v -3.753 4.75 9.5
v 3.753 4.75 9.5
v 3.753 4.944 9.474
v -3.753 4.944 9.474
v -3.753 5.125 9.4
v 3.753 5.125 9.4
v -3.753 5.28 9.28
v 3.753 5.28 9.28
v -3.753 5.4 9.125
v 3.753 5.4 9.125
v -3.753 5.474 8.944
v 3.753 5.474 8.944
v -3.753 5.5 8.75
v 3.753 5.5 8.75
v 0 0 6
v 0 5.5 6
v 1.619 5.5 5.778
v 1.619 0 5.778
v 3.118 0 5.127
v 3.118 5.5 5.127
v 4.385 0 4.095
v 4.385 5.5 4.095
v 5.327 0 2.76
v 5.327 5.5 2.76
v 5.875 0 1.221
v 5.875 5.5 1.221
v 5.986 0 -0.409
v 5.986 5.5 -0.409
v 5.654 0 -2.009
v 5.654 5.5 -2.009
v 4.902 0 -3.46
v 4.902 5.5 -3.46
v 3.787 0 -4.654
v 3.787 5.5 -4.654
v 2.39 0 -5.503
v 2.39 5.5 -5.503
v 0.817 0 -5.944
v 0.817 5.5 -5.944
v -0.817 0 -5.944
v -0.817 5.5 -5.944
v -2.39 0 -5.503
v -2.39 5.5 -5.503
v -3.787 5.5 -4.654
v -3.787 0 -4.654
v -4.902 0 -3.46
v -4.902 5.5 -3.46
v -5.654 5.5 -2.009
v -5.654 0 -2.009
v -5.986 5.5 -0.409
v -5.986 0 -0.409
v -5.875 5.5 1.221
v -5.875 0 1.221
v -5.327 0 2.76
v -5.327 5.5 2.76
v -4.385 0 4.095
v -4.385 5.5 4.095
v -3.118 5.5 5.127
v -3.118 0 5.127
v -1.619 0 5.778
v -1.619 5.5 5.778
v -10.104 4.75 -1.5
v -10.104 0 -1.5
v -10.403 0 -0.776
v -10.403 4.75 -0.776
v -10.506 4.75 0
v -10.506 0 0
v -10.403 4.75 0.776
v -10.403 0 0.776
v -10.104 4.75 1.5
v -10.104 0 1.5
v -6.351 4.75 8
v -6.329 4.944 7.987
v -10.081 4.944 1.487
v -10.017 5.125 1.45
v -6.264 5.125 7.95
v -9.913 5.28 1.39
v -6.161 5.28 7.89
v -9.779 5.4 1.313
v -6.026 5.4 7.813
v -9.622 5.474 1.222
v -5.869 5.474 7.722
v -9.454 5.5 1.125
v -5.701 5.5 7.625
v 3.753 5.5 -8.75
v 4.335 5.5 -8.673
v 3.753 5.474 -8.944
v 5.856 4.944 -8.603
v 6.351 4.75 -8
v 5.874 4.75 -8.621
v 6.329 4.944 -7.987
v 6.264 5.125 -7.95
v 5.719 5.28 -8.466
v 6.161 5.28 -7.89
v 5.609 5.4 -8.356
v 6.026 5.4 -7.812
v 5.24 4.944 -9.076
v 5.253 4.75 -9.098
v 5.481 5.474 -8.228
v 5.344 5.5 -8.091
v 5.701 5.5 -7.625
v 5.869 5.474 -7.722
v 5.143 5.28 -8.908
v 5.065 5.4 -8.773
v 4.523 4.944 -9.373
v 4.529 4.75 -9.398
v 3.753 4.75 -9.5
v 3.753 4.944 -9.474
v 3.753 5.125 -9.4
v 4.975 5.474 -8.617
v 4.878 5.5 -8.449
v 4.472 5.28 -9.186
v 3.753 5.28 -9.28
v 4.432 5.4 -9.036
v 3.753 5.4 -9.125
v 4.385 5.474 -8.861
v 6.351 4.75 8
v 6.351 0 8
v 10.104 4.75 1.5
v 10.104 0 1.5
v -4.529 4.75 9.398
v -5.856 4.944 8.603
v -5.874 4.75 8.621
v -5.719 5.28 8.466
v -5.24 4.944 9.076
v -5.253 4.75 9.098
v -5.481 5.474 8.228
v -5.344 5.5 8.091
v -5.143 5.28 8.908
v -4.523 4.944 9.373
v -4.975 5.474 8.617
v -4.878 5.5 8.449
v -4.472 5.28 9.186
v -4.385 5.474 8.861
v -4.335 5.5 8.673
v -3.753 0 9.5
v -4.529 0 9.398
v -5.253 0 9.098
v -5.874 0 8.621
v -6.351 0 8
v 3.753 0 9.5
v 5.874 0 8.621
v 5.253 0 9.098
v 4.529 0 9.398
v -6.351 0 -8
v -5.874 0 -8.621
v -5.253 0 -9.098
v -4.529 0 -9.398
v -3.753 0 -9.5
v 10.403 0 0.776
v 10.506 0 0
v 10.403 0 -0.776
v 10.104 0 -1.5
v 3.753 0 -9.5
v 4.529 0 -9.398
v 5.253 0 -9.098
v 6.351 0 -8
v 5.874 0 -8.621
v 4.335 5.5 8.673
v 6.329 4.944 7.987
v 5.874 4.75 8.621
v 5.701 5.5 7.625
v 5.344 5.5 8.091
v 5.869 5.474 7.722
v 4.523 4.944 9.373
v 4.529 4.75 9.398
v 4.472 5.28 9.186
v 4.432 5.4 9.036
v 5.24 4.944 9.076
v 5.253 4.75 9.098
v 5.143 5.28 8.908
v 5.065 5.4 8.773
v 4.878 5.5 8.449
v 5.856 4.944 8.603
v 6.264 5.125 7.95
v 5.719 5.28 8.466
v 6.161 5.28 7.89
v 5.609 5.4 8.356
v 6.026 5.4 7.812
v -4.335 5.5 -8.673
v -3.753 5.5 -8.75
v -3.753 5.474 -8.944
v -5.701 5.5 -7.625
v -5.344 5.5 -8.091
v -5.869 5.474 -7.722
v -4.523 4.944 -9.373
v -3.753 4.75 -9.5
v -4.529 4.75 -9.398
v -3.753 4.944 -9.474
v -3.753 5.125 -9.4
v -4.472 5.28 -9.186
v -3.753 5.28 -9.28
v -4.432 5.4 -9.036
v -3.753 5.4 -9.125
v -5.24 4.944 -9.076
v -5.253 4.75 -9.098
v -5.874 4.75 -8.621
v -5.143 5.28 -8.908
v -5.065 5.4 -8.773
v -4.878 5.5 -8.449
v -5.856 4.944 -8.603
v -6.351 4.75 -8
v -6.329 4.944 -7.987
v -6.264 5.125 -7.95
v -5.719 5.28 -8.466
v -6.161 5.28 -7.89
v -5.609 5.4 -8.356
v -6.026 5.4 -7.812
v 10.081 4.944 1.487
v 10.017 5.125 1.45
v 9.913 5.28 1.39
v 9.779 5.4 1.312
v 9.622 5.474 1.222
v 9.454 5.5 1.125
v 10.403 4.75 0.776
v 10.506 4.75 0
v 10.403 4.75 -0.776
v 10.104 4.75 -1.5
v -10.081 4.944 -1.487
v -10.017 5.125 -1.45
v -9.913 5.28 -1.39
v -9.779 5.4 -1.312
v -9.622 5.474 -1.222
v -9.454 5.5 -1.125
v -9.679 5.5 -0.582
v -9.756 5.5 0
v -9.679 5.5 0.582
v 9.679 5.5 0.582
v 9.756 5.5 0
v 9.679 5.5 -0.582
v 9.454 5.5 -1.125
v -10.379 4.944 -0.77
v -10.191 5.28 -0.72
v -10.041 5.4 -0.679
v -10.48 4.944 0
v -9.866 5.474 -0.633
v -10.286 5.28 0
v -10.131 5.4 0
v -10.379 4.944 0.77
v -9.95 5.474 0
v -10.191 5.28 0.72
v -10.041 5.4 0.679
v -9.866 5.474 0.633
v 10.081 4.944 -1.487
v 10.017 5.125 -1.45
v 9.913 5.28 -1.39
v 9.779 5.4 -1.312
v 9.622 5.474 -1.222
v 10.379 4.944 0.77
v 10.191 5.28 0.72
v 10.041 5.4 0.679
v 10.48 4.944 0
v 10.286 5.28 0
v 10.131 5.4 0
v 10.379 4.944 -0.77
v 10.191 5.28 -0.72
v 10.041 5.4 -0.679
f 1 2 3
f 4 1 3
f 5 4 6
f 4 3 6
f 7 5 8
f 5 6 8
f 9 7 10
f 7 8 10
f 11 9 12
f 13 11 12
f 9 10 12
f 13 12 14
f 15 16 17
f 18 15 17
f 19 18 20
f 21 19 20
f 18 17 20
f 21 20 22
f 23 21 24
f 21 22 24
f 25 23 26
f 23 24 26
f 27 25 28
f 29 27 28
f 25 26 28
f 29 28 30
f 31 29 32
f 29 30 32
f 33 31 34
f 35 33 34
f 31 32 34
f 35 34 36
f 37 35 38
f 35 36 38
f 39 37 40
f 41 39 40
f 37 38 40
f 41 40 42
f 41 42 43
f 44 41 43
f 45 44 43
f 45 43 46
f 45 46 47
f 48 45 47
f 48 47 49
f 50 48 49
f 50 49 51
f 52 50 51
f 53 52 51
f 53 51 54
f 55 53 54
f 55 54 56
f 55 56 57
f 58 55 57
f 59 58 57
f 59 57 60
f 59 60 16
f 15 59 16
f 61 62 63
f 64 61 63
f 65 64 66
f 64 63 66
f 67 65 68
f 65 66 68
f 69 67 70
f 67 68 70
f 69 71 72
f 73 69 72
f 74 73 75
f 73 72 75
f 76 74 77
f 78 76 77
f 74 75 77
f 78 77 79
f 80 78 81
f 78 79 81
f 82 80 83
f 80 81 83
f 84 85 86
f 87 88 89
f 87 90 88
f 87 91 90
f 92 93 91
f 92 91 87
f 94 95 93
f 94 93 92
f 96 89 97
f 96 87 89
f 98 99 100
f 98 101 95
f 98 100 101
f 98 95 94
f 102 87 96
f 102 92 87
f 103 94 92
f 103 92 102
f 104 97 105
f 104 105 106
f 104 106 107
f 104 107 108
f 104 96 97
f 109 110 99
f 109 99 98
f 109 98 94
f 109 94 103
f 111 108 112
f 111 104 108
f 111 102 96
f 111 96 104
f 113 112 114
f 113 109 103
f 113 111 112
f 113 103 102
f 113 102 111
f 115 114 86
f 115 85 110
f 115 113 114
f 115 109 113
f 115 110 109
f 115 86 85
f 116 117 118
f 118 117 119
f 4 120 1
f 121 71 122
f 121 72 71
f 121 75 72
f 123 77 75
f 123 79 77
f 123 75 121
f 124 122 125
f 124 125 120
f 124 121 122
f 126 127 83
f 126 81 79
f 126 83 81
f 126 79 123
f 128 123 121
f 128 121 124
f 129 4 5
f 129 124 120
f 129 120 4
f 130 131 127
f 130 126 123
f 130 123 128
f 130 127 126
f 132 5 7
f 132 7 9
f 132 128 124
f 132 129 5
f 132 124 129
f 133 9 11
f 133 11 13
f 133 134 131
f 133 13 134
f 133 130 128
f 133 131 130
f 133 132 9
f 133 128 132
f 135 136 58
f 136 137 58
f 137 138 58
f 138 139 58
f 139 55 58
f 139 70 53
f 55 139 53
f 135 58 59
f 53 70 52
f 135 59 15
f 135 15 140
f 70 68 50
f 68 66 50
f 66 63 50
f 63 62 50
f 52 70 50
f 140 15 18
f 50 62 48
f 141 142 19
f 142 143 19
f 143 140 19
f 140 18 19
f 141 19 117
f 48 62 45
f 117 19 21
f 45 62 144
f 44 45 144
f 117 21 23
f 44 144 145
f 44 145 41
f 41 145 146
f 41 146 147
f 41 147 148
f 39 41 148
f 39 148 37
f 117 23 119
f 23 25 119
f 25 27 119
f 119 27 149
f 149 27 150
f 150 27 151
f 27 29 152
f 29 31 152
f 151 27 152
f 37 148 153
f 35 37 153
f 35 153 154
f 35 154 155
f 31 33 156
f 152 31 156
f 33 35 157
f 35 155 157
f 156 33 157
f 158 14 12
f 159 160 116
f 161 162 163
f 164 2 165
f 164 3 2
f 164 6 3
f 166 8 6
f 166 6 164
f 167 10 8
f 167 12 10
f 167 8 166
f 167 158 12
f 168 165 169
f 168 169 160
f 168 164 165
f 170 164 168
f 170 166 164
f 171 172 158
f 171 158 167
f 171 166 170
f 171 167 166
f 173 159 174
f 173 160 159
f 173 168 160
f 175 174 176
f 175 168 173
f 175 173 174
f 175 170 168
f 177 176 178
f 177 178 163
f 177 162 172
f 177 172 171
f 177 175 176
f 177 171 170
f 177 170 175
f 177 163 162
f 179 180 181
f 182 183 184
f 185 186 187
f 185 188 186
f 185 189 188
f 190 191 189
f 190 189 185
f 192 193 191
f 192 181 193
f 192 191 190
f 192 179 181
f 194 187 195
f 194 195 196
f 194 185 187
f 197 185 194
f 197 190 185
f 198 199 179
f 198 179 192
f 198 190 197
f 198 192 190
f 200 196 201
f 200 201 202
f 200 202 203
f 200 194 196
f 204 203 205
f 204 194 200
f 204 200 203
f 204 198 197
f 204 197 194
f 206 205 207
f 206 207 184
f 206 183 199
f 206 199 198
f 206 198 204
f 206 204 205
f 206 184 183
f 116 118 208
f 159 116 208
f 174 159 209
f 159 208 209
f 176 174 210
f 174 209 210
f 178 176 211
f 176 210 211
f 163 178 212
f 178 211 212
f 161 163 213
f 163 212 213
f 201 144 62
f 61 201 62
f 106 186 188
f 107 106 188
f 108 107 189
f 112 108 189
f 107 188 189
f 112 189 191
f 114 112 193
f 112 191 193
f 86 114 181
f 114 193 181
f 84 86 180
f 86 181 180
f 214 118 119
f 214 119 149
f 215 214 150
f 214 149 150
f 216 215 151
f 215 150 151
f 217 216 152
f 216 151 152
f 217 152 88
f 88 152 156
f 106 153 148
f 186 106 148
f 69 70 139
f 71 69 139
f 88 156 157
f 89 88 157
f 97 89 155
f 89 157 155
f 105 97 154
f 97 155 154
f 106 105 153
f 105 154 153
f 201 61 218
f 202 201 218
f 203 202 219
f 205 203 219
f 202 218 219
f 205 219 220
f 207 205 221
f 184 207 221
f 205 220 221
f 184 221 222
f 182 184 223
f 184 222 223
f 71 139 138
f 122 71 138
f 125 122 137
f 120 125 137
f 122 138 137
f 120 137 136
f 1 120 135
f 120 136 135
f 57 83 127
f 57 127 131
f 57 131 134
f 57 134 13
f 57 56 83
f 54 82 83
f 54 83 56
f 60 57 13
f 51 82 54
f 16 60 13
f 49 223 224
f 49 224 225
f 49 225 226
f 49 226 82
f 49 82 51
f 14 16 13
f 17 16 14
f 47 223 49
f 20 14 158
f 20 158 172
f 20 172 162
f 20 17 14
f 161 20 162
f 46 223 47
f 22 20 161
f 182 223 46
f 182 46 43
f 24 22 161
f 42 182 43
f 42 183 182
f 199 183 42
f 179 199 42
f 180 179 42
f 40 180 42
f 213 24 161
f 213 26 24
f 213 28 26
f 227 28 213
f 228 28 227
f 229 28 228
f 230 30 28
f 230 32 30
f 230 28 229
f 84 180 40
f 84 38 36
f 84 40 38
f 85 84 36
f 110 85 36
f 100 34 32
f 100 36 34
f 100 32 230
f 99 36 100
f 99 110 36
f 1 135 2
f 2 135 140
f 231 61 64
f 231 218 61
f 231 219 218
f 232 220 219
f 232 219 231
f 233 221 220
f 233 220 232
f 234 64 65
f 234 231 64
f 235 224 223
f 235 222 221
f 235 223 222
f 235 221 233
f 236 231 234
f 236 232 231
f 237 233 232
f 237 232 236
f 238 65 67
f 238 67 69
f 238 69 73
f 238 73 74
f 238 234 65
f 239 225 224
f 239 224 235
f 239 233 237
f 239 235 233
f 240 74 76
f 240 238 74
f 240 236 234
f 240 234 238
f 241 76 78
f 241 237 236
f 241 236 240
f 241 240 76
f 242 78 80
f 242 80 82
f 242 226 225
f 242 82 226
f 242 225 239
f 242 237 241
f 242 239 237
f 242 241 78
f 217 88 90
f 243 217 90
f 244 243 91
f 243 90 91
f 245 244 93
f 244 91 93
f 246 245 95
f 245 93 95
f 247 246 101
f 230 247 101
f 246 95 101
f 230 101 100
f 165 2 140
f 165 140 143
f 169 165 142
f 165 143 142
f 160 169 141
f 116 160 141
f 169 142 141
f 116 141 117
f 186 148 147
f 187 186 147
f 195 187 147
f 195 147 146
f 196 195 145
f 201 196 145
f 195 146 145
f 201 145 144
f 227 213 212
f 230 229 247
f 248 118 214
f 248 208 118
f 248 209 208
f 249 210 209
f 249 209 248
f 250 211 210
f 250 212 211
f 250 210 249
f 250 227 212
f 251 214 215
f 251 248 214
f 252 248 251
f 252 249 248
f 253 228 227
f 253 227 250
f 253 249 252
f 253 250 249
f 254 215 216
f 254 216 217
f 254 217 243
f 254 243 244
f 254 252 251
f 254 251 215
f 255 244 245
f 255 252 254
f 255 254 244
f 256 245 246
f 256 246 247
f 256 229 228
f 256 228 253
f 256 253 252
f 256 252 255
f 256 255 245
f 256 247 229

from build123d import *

# Parameters (mm, degrees)
BOSS_EXTRUDE1_DEPTH = 5.5
FILLET1_R           = 0.75
FILLET2_R           = 3
SKETCH2_R           = 6
CUT_EXTRUDE1_DEPTH  = 16.19429676984497


with BuildPart() as part:
    # Sketch1 → Boss-Extrude1 (new body)
    with BuildSketch(Plane(origin=(0, 0, 0), x_dir=(1, 0, 0), z_dir=(0, 1, 0))):
        Polygon((10.969655114602853, 0), (5.484827557301405, 9.499999999999982), (-5.48482755730147, 9.499999999999945), (-10.969655114602851, -7.66e-14), (-5.484827557301339, -9.50000000000002), (5.4848275573015375, -9.499999999999904), align=None)
    extrude(amount=BOSS_EXTRUDE1_DEPTH)

    # Fillet1
    fillet1_edges = [part.edges().sort_by_distance(p)[0] for p in [
        (-3.286e-14, 5.5, -9.499999999999964),
        (-8.227241335952161, 5.5, -4.749999999999934),
        (-8.227241335952096, 5.5, 4.750000000000048),
        (9.859e-14, 5.5, 9.499999999999961),
        (8.227241335952195, 5.5, 4.749999999999952),
        (8.22724133595213, 5.5, -4.749999999999991),
    ]]
    fillet(fillet1_edges, radius=FILLET1_R)

    # Fillet2
    # the kernel refuses this fillet: 3 mm, written as the material it takes off along each edge
    with BuildSketch(Plane(origin=(3.752776749732533, 5.5, -6.499999999999977), x_dir=(0.8660254037844382, 0, -0.500000000000001), z_dir=(0.500000000000001, 0, 0.8660254037844382))) as fillet2_piece_1:
        with BuildLine():
            CenterArc((2.25, -0.75), 0.75, 0, 90)
            Line((3, -0.75), (3, 0))
            Line((3, 0), (2.25, 0))
        make_face()
    revolve(axis=Axis((3.752776749732533, 5.5, -6.499999999999977), (0, 1, 0)), revolution_arc=60.000000000000135, mode=Mode.SUBTRACT)
    with BuildSketch(Plane(origin=(7.505553499465103, 5.5, 1.221e-14), x_dir=(0.8660254037844416, 0, 0.49999999999999495), z_dir=(-0.49999999999999495, 0, 0.8660254037844416))) as fillet2_piece_2:
        with BuildLine():
            CenterArc((2.25, -0.75), 0.75, 0, 90)
            Line((3, -0.75), (3, 0))
            Line((3, 0), (2.25, 0))
        make_face()
    revolve(axis=Axis((7.505553499465103, 5.5, 1.221e-14), (0, 1, 0)), revolution_arc=59.99999999999973, mode=Mode.SUBTRACT)
    with BuildSketch(Plane(origin=(-3.752776749732577, 5.5, -6.49999999999995), x_dir=(-3.4e-15, 0, -1), z_dir=(1, 0, -3.4e-15))) as fillet2_piece_3:
        with BuildLine():
            CenterArc((2.25, -0.75), 0.75, 0, 90)
            Line((3, -0.75), (3, 0))
            Line((3, 0), (2.25, 0))
        make_face()
    revolve(axis=Axis((-3.752776749732577, 5.5, -6.49999999999995), (0, 1, 0)), revolution_arc=60.00000000000015, mode=Mode.SUBTRACT)
    with BuildSketch(Plane(origin=(3.7527767497326376, 5.5, 6.499999999999923), x_dir=(1.053e-14, 0, 1), z_dir=(-1, 0, 1.053e-14))) as fillet2_piece_4:
        with BuildLine():
            CenterArc((2.25, -0.75), 0.75, 0, 90)
            Line((3, -0.75), (3, 0))
            Line((3, 0), (2.25, 0))
        make_face()
    revolve(axis=Axis((3.7527767497326376, 5.5, 6.499999999999923), (0, 1, 0)), revolution_arc=59.99999999999973, mode=Mode.SUBTRACT)
    with BuildSketch(Plane(origin=(-7.505553499465096, 5.5, 5.373e-14), x_dir=(-0.8660254037844417, 0, -0.49999999999999484), z_dir=(0.49999999999999484, 0, -0.8660254037844417))) as fillet2_piece_5:
        with BuildLine():
            CenterArc((2.25, -0.75), 0.75, 0, 90)
            Line((3, -0.75), (3, 0))
            Line((3, 0), (2.25, 0))
        make_face()
    revolve(axis=Axis((-7.505553499465096, 5.5, 5.373e-14), (0, 1, 0)), revolution_arc=60.00000000000011, mode=Mode.SUBTRACT)
    with BuildSketch(Plane(origin=(-3.752776749732488, 5.5, 6.500000000000002), x_dir=(-0.8660254037844347, 0, 0.5000000000000068), z_dir=(-0.5000000000000068, 0, -0.8660254037844347))) as fillet2_piece_6:
        with BuildLine():
            CenterArc((2.25, -0.75), 0.75, 0, 90)
            Line((3, -0.75), (3, 0))
            Line((3, 0), (2.25, 0))
        make_face()
    revolve(axis=Axis((-3.752776749732488, 5.5, 6.500000000000002), (0, 1, 0)), revolution_arc=60.00000000000016, mode=Mode.SUBTRACT)
    with BuildSketch(Plane(origin=(-5.484827557301339, -4.330127018922208, 9.50000000000002), x_dir=(1, 0, -1.026e-14), z_dir=(0, 1, 0))) as fillet2_piece_7:
        with BuildLine():
            CenterArc((FILLET2_R * 0.57735026919, FILLET2_R), FILLET2_R, 209.99999999999983, 60.00000000000017)
            Line((-FILLET2_R * 0.288675134595, FILLET2_R * 0.5), (0, 0))
            Line((0, 0), (FILLET2_R * 0.57735026919, 0))
        make_face()
    extrude(amount=9.830127018922209, mode=Mode.SUBTRACT)
    with BuildSketch(Plane(origin=(-10.969655114602851, -4.3301270189222, 7.638e-14), x_dir=(0.4999999999999946, 0, -0.8660254037844417), z_dir=(0, 1, 0))) as fillet2_piece_8:
        with BuildLine():
            CenterArc((FILLET2_R * 0.57735026919, -FILLET2_R), FILLET2_R, 89.99999999999999, 60.00000000000007)
            Line((-FILLET2_R * 0.288675134595, -FILLET2_R * 0.5), (0, 0))
            Line((0, 0), (FILLET2_R * 0.57735026919, 3e-17))
        make_face()
    extrude(amount=9.8301270189222, mode=Mode.SUBTRACT)
    with BuildSketch(Plane(origin=(-5.484827557301471, -4.330127018922209, -9.499999999999945), x_dir=(1, 0, -3.08e-15), z_dir=(0, 1, 0))) as fillet2_piece_9:
        with BuildLine():
            CenterArc((FILLET2_R * 0.57735026919, -FILLET2_R), FILLET2_R, 90.00000000000003, 60.00000000000017)
            Line((-FILLET2_R * 0.288675134595, -FILLET2_R * 0.5), (0, 0))
            Line((0, 0), (FILLET2_R * 0.57735026919, 0))
        make_face()
    extrude(amount=9.830127018922209, mode=Mode.SUBTRACT)
    with BuildSketch(Plane(origin=(5.484827557301404, -4.330127018922204, -9.499999999999982), x_dir=(0.5000000000000011, 0, 0.866025403784438), z_dir=(0, 1, 0))) as fillet2_piece_10:
        with BuildLine():
            CenterArc((FILLET2_R * 0.57735026919, -FILLET2_R), FILLET2_R, 90, 60.00000000000014)
            Line((-FILLET2_R * 0.288675134595, -FILLET2_R * 0.5), (0, 0))
            Line((0, 0), (FILLET2_R * 0.57735026919, 1.1e-16))
        make_face()
    extrude(amount=9.830127018922205, mode=Mode.SUBTRACT)
    with BuildSketch(Plane(origin=(10.969655114602853, -4.330127018922171, 0), x_dir=(-0.500000000000001, 0, -0.8660254037844382), z_dir=(0, 1, 0))) as fillet2_piece_11:
        with BuildLine():
            CenterArc((FILLET2_R * 0.57735026919, FILLET2_R), FILLET2_R, 210.00000000000028, 59.999999999999716)
            Line((-FILLET2_R * 0.288675134595, FILLET2_R * 0.5), (0, 0))
            Line((0, 0), (FILLET2_R * 0.57735026919, 6e-17))
        make_face()
    extrude(amount=9.83012701892217, mode=Mode.SUBTRACT)
    with BuildSketch(Plane(origin=(5.4848275573015375, -4.330127018922169, 9.499999999999904), x_dir=(0.499999999999995, 0, -0.8660254037844415), z_dir=(0, 1, 0))) as fillet2_piece_12:
        with BuildLine():
            CenterArc((FILLET2_R * 0.57735026919, FILLET2_R), FILLET2_R, 210.00000000000028, 59.999999999999716)
            Line((-FILLET2_R * 0.288675134595, FILLET2_R * 0.5), (0, 0))
            Line((0, 0), (FILLET2_R * 0.57735026919, 6e-17))
        make_face()
    extrude(amount=9.83012701892217, mode=Mode.SUBTRACT)

    # Sketch2 → Cut-Extrude1 (cut, through all)
    with BuildSketch(Plane(origin=(0, 5.5, 0), x_dir=(1, 0, 0), z_dir=(0, 1, 0))):
        with Locations(Location((0, 0, 0), (0, 0, 270))):
            Circle(SKETCH2_R)
    extrude(amount=-CUT_EXTRUDE1_DEPTH, mode=Mode.SUBTRACT)


solid = part.part
